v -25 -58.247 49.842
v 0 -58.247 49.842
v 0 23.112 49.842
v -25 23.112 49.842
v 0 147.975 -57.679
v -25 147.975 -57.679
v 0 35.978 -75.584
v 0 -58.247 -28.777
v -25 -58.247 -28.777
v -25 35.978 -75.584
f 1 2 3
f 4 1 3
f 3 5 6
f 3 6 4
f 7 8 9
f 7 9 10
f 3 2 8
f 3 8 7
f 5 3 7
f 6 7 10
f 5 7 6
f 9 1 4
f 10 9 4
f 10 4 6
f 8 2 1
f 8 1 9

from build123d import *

# Parameters (mm, degrees)
F0_W     = 81.358406
F0_H     = 78.619389
F1_DEPTH = 25


with BuildPart() as f1:
    # F0 (on Right) → F1 (new body)
    with BuildSketch(Plane.YZ):
        Polygon((23.111533, -28.777307), (-58.246873, -28.777307), (35.977684, -75.584203), (147.975132, -57.679411), align=None)
        Polygon((147.975132, -57.679411), (23.111533, 49.842082), (23.111533, -28.777307), align=None)
        with Locations((-17.56767, 10.532387)):
            Rectangle(F0_W, F0_H)
    extrude(amount=-F1_DEPTH)


solid = f1.part
